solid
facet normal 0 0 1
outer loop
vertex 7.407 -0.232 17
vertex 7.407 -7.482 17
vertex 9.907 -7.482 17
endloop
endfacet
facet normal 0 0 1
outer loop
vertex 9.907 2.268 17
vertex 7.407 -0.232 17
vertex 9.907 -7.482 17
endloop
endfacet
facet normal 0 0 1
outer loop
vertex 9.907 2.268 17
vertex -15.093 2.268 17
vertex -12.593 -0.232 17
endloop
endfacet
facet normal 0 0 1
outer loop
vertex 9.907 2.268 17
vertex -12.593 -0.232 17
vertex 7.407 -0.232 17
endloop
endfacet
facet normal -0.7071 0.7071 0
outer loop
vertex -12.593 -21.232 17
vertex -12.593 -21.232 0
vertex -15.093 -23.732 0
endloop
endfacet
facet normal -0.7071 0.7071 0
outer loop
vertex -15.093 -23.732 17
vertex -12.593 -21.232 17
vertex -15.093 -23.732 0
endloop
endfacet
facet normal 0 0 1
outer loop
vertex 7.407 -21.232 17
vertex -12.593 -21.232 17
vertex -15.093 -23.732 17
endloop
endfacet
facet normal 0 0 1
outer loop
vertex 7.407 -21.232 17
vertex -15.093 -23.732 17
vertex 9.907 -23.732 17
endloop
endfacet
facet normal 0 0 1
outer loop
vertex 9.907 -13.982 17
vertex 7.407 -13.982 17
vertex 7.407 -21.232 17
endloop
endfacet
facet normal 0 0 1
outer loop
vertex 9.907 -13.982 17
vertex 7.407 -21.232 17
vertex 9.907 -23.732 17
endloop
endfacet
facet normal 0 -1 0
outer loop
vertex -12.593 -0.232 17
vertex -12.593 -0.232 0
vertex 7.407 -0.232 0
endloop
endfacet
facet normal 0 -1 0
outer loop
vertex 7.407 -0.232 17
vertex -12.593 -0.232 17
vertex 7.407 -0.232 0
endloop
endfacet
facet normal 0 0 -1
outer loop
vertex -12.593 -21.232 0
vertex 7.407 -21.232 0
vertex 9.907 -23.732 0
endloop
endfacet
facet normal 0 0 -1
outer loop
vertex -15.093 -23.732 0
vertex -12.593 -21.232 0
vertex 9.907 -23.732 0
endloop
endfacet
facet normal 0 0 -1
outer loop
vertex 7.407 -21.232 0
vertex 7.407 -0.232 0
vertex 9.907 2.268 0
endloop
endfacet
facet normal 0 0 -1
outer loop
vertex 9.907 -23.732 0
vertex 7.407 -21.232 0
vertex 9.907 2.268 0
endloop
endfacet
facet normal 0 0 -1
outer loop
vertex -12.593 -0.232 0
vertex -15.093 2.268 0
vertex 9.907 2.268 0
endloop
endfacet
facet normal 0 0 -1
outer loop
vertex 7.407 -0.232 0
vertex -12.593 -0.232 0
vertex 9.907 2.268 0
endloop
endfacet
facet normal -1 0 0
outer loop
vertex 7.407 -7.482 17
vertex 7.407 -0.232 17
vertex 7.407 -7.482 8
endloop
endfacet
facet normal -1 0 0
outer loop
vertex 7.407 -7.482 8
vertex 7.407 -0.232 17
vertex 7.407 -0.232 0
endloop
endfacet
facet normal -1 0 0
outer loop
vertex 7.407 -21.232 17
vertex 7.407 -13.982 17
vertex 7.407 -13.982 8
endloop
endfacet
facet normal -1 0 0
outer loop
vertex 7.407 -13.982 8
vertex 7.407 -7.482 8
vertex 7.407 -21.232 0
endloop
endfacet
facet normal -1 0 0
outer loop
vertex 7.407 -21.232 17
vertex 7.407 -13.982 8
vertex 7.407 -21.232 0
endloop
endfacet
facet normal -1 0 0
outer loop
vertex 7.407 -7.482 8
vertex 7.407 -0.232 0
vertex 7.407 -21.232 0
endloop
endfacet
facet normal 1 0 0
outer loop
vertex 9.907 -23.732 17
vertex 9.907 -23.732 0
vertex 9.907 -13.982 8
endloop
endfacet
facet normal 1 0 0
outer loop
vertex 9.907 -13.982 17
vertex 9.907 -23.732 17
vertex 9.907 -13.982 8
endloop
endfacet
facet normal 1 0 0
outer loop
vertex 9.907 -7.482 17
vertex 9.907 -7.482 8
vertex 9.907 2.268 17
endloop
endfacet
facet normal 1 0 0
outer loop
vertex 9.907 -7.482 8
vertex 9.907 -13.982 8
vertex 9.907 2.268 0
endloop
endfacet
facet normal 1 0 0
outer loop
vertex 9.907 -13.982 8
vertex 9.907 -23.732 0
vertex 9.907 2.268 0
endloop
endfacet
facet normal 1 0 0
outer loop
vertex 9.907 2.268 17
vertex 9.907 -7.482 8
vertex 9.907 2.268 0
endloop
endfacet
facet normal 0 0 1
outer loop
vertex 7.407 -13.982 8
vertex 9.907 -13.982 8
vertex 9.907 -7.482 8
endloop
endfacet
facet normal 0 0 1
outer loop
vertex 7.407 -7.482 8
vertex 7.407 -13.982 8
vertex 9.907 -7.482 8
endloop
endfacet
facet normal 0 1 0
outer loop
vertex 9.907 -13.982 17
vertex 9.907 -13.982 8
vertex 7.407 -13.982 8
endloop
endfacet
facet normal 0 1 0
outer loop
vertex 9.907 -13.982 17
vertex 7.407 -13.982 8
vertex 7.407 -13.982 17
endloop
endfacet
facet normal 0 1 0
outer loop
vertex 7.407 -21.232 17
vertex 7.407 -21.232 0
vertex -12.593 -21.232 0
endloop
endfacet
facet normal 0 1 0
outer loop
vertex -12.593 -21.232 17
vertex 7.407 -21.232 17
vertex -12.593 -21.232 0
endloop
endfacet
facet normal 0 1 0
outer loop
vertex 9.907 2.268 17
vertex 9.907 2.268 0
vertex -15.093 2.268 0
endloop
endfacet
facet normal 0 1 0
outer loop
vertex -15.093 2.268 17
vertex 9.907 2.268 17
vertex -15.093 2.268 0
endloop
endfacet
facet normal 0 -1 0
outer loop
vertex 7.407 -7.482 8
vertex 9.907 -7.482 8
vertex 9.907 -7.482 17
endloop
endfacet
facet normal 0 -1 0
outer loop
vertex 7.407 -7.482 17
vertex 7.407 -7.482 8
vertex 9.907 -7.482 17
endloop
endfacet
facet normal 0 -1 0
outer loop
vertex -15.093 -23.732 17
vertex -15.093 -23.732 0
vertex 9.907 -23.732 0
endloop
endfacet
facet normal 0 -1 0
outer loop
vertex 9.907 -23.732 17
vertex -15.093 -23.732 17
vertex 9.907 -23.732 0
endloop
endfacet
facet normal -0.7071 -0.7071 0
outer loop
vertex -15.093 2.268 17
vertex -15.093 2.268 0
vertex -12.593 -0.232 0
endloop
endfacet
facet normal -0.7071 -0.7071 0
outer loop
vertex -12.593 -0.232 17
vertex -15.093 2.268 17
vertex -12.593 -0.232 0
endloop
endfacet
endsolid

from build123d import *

# Parameters (mm, degrees)
F1_DEPTH = 17
F2_W     = 6.5
F2_H     = 9
F3_DEPTH = 25


with BuildPart() as f1:
    # F0 (on Top) → F1 (new body)
    with BuildSketch(Plane.XY):
        Polygon((-15.092822, 2.267766), (-12.592822, -0.232234), (7.407178, -0.232234), (7.407178, -21.232234), (-12.592822, -21.232234), (-15.092822, -23.732234), (9.907178, -23.732234), (9.907178, 2.267766), align=None)
    extrude(amount=F1_DEPTH)

    # F2 (on face) → F3 (cut)
    with BuildSketch(Plane.YZ.offset(9.907178)):
        with Locations((-10.732234, 12.5)):
            Rectangle(F2_W, F2_H)
    extrude(amount=-F3_DEPTH, mode=Mode.SUBTRACT)


solid = f1.part
